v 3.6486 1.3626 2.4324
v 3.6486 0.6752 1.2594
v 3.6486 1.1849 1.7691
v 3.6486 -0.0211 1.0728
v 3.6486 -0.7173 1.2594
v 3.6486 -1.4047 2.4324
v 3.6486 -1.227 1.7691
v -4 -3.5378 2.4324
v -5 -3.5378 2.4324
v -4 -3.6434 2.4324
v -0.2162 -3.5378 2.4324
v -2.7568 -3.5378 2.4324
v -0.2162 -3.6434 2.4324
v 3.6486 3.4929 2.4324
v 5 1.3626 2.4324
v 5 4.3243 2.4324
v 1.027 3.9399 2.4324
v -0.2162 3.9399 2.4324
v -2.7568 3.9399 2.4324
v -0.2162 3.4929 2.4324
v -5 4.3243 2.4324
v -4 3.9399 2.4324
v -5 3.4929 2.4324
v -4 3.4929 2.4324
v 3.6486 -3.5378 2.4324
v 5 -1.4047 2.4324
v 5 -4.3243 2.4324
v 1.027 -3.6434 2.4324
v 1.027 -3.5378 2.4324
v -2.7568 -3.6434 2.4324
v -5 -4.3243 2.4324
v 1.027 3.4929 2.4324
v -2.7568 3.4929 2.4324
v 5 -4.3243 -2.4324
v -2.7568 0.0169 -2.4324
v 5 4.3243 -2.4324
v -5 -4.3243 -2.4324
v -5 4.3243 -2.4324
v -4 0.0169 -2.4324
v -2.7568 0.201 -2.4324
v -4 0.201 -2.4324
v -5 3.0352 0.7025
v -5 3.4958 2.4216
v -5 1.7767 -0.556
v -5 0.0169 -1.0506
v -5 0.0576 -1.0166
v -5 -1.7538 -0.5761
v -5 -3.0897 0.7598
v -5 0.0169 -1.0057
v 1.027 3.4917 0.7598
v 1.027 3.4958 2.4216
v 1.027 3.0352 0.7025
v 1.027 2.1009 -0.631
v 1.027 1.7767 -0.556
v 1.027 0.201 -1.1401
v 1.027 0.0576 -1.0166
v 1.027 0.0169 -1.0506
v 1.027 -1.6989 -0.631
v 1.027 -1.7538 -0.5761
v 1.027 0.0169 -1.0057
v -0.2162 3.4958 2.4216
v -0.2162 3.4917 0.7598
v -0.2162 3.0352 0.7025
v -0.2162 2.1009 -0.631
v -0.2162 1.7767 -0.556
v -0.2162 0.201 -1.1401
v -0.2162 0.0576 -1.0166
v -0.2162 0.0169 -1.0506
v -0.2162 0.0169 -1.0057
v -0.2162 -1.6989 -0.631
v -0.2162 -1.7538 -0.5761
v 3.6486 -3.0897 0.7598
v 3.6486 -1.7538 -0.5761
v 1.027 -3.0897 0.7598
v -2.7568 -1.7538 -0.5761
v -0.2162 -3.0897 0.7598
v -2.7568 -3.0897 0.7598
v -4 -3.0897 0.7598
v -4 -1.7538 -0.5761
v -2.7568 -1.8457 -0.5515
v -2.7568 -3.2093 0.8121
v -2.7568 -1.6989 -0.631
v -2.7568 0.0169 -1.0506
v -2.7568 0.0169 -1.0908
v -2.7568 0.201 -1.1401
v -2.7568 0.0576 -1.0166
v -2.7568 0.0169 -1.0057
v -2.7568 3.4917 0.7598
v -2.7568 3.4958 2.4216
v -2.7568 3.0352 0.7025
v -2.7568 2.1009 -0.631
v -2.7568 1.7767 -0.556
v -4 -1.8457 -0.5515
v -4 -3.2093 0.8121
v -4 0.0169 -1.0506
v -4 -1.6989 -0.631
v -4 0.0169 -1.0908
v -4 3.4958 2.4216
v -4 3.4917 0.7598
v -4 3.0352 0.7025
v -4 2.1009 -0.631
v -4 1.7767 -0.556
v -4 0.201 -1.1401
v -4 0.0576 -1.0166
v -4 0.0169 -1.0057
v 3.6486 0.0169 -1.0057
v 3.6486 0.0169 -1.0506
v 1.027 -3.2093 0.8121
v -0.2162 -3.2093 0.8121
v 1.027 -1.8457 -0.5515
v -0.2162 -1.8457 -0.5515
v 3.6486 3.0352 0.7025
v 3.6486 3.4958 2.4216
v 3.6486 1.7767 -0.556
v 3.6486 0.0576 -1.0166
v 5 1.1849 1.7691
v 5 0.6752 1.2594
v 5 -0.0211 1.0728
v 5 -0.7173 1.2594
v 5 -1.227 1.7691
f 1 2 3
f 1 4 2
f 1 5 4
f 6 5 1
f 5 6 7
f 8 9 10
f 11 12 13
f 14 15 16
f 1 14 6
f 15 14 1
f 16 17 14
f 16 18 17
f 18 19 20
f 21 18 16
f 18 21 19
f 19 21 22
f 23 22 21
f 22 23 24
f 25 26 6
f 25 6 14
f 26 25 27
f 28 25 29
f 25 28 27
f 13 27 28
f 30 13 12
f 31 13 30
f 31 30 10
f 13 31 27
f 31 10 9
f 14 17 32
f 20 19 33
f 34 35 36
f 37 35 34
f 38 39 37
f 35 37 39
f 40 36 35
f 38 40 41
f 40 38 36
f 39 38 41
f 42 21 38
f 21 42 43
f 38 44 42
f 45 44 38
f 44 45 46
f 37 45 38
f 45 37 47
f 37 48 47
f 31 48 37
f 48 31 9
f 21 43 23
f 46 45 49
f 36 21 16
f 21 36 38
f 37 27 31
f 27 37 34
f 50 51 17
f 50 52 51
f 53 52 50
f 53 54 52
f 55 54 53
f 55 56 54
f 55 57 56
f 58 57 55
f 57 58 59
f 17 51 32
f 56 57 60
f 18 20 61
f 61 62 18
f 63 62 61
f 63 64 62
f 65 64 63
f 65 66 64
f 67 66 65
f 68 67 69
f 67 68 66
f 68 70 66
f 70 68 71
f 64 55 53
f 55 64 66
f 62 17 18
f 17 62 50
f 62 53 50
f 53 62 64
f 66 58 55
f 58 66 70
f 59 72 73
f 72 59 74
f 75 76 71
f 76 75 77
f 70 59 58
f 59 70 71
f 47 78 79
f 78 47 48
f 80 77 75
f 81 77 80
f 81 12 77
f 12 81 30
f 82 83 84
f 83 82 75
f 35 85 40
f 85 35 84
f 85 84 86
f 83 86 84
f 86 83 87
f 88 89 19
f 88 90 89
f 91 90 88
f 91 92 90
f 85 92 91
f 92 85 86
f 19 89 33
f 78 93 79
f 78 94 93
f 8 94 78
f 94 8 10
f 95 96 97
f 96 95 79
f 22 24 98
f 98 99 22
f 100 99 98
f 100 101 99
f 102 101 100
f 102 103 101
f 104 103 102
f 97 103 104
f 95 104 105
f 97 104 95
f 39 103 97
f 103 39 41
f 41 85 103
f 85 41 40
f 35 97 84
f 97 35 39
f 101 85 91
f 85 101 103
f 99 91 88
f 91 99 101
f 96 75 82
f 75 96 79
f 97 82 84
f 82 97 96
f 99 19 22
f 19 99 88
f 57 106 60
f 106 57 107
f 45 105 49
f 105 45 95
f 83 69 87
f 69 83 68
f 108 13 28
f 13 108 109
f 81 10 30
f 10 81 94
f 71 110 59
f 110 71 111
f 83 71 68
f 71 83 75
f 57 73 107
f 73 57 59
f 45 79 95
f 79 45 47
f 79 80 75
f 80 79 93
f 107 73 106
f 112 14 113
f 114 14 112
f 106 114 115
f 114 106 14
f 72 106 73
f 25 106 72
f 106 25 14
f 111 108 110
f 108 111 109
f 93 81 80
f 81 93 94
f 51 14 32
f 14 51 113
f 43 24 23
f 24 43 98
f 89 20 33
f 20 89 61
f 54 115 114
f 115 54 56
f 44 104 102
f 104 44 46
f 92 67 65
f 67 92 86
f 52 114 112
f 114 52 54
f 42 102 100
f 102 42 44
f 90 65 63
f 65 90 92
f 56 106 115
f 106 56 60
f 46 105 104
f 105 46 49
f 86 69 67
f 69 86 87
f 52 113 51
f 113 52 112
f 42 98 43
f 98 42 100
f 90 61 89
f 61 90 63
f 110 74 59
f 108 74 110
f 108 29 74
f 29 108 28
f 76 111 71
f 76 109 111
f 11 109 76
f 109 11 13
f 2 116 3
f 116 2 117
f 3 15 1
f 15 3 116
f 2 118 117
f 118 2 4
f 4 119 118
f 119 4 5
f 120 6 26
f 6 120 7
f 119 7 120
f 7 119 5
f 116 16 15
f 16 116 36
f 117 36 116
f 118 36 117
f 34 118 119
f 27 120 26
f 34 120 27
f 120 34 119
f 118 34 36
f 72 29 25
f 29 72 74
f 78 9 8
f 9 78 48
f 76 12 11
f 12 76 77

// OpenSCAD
intersection() {
translate([-6.000000, -5.189184, -2.918916])
cube(size = [12.000000, 10.378368, 5.837832], center = false);
union() {
// Begin.
union() {
difference() {
difference() {
difference() {
difference() {
rotate([0, -0, 0])
translate([-0.675675, 0, 0])
cube(size = [8.64865, 8.64864, 4.86486], center = true);

rotate([0, -0, 0])
translate([0.405405, 0.20101, 2.65962])
rotate([0, 90, 0])
cylinder(h = 1.24325, r1 = 3.79973, r2 = 3.79973, center = true, $fn = 12);
}

union() {
rotate([0, -0, 0])
translate([-3.37838, 0.108975, 0])
cube(size = [1.24324, 0.18407, 4.86486], center = true);

rotate([0, -0, 0])
translate([-3.37838, 0.20101, 2.65962])
rotate([0, 90, 0])
cylinder(h = 1.24324, r1 = 3.79973, r2 = 3.79973, center = true, $fn = 12);
}
}

intersection() {
rotate([0, -0, 0])
translate([-0.675675, -2.15369, 7.88379])
cube(size = [8.64865, 4.34126, 20.6324], center = true);

rotate([0, -0, 0])
translate([-7.27568, 0.01694, 2.67473])
rotate([0, 90, 0])
cylinder(h = 21.8486, r1 = 3.72531, r2 = 3.72531, center = true, $fn = 12);
}
}

rotate([0, -0, 0])
translate([-7.27568, 0.05763, 2.42156])
rotate([0, 90, 0])
cylinder(h = 21.8486, r1 = 3.43817, r2 = 3.43817, center = true, $fn = 12);
}

difference() {
difference() {
rotate([0, -0, 0])
translate([0, 0, 0])
cube(size = [10, 8.64864, 4.86486], center = true);

union() {
union() {
rotate([0, -0, 0])
translate([0.405405, 0.01694, 2.67473])
rotate([0, 90, 0])
cylinder(h = 1.24325, r1 = 3.72531, r2 = 3.72531, center = true, $fn = 12);

rotate([0, -0, 0])
translate([-3.37838, 6.93784, 0])
cube(size = [1.24324, 22.5243, 4.86486], center = true);
}

rotate([0, -0, 0])
translate([-6.6, -0.02106, 2.46531])
rotate([0, 90, 0])
cylinder(h = 23.2, r1 = 1.3925, r2 = 1.3925, center = true, $fn = 12);
}
}

rotate([0, -0, 0])
translate([-7.27568, 0.20101, 2.65962])
rotate([0, 90, 0])
cylinder(h = 21.8486, r1 = 3.79973, r2 = 3.79973, center = true, $fn = 12);
}
}
// End.
}
}
